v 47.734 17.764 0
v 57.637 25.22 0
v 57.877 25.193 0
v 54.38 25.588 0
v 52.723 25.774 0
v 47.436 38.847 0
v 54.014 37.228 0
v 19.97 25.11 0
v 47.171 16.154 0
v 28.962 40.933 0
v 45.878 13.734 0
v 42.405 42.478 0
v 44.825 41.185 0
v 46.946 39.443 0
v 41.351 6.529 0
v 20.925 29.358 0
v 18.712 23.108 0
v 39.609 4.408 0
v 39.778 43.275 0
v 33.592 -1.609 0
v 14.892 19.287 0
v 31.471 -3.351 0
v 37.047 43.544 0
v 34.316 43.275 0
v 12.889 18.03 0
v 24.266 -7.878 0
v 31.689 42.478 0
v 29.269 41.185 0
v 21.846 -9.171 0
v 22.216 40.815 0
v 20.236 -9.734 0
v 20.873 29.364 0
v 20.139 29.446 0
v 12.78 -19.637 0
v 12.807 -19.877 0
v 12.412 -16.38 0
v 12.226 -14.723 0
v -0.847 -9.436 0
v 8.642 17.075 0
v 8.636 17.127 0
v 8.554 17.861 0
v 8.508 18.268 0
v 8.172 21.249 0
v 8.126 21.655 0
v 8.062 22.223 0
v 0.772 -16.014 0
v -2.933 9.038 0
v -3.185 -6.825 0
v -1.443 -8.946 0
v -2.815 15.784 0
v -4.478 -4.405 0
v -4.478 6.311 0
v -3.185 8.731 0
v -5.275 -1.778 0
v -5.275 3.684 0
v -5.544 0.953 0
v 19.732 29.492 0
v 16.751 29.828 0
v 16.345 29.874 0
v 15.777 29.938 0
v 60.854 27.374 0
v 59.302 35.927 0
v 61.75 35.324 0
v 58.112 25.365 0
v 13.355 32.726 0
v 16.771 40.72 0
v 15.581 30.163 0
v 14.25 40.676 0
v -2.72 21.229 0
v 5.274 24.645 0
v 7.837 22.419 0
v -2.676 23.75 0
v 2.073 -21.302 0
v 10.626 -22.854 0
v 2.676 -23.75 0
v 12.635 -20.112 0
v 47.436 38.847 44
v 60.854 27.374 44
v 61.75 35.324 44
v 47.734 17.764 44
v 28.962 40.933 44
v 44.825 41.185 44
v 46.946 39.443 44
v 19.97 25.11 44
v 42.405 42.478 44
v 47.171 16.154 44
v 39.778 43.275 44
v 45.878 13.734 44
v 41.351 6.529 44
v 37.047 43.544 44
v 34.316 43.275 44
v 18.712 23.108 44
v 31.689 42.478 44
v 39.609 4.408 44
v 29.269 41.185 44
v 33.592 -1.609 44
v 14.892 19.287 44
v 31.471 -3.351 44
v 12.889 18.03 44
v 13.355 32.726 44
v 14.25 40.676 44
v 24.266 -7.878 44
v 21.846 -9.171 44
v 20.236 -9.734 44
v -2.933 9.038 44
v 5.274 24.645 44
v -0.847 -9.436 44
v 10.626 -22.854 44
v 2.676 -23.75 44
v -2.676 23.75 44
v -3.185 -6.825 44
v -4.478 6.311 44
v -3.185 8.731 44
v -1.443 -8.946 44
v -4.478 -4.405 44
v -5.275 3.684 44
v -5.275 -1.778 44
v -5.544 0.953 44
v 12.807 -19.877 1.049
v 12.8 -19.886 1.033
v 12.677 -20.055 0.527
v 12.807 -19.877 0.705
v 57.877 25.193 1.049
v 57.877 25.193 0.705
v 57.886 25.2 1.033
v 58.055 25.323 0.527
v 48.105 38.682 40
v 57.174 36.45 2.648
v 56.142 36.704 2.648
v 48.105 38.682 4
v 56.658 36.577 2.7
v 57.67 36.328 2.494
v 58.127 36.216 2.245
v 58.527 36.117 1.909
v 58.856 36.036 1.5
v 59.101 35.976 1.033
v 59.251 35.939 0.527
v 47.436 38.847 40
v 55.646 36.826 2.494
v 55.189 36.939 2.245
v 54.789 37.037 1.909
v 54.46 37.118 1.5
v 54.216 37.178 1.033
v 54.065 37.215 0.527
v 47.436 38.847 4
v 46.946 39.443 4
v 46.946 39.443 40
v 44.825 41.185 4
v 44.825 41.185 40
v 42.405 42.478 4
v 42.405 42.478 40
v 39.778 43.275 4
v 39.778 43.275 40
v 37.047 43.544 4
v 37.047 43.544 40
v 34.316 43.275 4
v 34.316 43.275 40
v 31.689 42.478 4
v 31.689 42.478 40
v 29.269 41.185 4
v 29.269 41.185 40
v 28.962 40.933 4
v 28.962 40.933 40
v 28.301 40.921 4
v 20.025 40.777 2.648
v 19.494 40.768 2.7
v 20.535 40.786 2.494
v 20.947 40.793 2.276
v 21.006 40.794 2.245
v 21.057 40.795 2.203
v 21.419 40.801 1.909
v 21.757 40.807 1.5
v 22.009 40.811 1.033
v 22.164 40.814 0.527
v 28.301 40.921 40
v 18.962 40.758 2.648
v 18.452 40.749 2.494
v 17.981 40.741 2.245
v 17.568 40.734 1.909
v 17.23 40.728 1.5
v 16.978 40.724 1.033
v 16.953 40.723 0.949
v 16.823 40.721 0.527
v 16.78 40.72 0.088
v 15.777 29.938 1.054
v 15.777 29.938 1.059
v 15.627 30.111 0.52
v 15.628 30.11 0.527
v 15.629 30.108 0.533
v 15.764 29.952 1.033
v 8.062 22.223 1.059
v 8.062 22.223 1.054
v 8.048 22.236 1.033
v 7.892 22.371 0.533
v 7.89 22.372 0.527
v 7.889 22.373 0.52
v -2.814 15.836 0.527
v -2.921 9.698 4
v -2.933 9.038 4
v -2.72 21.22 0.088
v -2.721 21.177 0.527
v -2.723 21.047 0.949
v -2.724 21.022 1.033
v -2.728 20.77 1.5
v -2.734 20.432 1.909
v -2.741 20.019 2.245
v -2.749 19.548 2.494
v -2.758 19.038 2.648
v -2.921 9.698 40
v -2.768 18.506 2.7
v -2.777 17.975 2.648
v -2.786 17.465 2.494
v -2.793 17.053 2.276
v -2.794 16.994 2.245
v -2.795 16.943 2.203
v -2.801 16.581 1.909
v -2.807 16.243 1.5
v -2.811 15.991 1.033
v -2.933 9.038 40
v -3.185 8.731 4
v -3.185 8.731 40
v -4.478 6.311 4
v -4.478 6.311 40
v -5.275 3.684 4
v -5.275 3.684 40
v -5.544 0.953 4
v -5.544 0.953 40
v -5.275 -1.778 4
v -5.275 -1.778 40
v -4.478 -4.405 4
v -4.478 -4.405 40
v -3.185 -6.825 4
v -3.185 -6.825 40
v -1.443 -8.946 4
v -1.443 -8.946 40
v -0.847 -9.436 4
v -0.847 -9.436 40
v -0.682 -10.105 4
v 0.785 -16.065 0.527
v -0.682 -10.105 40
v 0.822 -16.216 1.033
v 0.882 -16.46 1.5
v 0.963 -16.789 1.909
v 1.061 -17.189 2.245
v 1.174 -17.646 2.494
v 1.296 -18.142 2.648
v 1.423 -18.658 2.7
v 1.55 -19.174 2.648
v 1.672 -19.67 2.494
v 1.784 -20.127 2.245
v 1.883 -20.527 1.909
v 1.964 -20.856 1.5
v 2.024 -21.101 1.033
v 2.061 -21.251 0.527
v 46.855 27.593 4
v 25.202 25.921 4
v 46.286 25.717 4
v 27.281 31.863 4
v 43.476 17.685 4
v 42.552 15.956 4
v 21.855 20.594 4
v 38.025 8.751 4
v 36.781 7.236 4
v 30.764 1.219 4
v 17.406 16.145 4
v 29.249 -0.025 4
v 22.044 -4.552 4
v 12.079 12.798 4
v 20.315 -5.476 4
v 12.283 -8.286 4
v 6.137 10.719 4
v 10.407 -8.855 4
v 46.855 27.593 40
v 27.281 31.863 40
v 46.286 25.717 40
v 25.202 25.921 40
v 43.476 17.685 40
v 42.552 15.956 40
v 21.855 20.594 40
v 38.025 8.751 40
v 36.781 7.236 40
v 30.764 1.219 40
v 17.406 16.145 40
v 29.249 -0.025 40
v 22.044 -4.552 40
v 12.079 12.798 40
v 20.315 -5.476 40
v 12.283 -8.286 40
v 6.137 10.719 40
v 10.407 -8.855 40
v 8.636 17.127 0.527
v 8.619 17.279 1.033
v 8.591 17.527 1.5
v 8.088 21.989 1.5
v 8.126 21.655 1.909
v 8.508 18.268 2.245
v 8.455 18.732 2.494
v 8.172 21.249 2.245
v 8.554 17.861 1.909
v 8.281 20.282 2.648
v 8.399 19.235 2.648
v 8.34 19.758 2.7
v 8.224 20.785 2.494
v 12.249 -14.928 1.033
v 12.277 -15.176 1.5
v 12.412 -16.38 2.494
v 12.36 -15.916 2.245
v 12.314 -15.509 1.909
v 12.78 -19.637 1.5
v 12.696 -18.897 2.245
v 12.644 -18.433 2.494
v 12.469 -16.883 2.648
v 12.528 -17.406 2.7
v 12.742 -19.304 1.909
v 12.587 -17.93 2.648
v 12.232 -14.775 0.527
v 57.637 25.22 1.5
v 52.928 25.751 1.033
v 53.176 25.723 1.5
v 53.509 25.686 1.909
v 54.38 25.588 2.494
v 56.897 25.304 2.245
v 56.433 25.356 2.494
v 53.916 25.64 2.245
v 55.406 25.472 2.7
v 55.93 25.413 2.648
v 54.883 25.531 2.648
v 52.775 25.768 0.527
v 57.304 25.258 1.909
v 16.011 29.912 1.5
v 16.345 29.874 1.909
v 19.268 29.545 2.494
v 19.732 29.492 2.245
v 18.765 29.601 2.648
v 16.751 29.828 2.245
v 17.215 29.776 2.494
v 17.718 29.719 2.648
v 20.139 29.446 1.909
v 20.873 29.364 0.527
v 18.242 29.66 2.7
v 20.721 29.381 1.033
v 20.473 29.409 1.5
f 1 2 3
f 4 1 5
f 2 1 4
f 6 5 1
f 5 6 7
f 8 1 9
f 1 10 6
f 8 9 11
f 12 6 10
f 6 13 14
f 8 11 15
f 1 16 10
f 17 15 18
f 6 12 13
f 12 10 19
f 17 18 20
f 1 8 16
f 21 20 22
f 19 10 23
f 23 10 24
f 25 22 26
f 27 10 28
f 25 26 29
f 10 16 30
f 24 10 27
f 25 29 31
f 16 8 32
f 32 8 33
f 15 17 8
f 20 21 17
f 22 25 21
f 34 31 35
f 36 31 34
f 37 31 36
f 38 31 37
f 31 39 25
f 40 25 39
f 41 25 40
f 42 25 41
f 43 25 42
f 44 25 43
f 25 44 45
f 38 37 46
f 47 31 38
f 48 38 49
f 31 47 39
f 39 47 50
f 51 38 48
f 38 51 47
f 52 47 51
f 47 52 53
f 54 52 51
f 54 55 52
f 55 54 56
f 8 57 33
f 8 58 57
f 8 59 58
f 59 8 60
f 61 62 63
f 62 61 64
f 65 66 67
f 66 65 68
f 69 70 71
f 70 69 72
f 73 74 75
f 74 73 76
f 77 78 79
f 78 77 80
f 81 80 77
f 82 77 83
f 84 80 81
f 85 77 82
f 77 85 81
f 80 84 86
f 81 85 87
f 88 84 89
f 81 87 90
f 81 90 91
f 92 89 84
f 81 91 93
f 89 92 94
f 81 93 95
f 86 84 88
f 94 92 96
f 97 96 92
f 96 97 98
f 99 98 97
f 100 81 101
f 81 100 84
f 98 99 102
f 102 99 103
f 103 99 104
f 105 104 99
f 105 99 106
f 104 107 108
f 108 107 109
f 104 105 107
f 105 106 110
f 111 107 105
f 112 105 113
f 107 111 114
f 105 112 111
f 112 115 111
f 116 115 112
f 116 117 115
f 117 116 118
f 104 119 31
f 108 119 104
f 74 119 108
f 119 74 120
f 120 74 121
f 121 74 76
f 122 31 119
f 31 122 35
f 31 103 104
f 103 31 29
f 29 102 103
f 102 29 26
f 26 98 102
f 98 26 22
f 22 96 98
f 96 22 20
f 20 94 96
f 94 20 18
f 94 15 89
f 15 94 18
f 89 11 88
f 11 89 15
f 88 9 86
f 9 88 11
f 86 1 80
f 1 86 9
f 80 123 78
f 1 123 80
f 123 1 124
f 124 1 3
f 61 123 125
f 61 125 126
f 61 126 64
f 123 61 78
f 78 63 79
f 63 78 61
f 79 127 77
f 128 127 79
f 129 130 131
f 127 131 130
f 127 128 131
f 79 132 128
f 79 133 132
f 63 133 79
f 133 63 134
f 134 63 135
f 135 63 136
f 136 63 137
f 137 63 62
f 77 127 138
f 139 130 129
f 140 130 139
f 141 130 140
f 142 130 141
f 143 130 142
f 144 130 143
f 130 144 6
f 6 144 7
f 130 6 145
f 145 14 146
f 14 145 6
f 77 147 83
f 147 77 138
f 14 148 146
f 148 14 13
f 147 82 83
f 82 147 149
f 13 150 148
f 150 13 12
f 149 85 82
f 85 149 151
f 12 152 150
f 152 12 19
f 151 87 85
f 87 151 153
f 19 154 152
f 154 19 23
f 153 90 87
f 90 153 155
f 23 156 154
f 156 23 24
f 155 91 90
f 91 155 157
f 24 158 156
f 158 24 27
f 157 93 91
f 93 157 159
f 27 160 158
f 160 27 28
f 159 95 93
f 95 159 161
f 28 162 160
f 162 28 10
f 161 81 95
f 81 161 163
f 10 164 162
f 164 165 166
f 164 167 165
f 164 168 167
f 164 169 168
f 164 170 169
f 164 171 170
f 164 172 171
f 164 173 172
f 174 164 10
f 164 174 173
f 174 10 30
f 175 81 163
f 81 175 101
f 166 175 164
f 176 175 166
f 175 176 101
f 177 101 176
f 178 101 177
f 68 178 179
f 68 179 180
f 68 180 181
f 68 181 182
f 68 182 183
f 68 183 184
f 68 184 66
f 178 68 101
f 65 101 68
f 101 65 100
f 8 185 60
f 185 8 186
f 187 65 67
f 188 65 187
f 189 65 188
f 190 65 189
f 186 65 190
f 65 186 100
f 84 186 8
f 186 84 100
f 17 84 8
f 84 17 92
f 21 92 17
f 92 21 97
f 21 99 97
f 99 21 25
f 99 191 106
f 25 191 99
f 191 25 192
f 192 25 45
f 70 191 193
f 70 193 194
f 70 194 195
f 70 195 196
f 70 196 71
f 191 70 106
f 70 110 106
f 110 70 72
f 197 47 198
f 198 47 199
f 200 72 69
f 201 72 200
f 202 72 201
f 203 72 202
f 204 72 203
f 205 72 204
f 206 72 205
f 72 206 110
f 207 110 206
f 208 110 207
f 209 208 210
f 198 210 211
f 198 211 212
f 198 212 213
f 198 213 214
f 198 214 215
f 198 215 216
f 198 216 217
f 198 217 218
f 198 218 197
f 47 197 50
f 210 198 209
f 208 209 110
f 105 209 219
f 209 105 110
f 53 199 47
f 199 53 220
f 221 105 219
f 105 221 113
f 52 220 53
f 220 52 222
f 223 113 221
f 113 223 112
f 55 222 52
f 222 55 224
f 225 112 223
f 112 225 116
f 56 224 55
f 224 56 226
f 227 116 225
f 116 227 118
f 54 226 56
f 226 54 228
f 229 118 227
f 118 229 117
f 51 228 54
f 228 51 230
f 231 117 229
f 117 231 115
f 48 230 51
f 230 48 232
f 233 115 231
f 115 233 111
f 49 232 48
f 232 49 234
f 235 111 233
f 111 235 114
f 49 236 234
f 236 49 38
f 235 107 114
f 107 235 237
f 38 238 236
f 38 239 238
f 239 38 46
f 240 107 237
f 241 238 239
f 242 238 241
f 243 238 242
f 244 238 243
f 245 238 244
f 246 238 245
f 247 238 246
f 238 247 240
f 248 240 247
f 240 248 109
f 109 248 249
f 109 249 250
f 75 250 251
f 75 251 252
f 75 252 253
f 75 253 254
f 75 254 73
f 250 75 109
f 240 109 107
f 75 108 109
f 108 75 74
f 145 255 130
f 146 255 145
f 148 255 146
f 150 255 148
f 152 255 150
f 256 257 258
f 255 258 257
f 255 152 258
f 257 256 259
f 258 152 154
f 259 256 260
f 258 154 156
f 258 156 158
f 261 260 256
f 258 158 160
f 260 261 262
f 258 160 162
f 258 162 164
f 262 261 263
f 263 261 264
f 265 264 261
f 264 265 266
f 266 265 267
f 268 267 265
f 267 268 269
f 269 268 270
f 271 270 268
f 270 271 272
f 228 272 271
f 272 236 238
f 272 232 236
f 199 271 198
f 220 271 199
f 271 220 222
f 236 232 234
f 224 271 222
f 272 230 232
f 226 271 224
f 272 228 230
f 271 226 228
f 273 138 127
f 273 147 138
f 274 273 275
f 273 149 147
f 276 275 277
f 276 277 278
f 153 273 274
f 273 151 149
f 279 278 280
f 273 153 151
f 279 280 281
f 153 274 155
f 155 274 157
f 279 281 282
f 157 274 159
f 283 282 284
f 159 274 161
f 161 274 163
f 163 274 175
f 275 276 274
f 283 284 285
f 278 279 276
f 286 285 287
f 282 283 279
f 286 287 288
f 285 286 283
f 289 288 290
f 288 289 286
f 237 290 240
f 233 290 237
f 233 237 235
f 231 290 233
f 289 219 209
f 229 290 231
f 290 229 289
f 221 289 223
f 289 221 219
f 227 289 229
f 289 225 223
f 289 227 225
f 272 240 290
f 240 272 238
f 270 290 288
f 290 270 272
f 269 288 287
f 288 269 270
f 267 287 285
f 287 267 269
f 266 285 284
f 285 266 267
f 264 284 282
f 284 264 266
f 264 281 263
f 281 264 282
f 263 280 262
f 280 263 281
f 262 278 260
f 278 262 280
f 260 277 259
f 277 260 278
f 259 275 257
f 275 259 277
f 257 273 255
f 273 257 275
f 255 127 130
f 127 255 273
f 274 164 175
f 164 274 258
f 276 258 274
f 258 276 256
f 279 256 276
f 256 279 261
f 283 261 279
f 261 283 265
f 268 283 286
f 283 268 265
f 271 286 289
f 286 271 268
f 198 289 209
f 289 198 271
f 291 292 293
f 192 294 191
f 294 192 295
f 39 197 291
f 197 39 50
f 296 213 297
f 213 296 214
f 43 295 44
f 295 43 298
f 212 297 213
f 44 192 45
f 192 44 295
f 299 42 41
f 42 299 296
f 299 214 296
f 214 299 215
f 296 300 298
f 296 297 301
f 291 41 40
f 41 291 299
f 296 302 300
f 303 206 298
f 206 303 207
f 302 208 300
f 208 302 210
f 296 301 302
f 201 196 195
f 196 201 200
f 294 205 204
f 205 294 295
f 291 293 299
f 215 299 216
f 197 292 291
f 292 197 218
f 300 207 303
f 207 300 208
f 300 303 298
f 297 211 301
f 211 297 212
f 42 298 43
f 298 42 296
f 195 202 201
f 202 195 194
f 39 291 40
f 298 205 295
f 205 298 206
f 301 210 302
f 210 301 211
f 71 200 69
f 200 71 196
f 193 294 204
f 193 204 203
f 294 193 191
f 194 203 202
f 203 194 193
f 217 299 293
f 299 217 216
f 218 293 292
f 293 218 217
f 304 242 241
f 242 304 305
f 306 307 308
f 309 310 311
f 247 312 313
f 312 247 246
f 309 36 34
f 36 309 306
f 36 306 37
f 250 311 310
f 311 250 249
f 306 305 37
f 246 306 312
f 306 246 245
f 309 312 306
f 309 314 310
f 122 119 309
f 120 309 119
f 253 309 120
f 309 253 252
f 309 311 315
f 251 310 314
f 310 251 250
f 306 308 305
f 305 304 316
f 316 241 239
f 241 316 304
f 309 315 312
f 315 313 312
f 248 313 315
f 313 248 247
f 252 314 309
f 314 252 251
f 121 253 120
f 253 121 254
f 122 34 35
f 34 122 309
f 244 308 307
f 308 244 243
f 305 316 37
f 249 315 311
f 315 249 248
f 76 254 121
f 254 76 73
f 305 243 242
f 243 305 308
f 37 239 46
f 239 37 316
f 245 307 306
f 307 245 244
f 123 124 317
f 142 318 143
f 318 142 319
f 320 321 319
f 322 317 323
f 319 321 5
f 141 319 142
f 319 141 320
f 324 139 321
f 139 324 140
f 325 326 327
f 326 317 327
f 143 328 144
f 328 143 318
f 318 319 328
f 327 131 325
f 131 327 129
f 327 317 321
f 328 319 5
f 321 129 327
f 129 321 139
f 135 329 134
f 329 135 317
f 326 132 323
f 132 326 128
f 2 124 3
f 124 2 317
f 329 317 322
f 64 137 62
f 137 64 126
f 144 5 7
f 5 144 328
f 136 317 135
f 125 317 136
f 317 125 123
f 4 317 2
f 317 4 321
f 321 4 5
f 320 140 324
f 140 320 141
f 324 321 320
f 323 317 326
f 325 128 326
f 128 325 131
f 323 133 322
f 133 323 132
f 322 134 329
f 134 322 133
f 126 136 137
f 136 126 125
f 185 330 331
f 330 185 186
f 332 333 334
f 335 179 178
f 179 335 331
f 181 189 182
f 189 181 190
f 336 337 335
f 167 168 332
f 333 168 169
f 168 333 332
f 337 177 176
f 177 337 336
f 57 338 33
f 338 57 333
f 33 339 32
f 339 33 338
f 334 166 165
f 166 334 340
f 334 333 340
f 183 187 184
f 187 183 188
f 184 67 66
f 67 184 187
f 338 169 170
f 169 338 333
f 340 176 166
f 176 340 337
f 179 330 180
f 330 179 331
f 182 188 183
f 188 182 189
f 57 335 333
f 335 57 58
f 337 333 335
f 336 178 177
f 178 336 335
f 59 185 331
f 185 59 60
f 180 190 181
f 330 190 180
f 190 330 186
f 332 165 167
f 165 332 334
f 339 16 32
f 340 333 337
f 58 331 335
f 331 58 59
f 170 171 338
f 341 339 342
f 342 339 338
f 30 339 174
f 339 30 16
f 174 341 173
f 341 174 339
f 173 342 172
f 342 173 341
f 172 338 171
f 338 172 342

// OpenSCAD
$fn = 32;

// ----------------------------------------------------------------------
// Air duct: 28 mm duct, 4 mm wall, 44 mm across
// ----------------------------------------------------------------------

// --- parameters (mm) ---
duct_r = 14;              // duct core radius
duct_d = 28;              // duct core diameter
wall = 4;                 // duct wall thickness
height = 44;              // duct width (extrusion height)
port_r = 23.9;            // port flange half width
port_d = 47.8;            // port flange width
port_t = 8;               // port flange thickness
bolt_d = 5.4;             // port bolt holes
bolt_offset = 18.7;       // bolt hole offset from the port axis

difference() {
  /* outer hull chain: tube with a flat flange plate at every port */
  linear_extrude(height = 44) {
    hull() {
      polygon([[2.676, -23.75], [-2.676, 23.75], [5.274, 24.645], [10.626, -22.854]]);
      translate([10.931, 1.232]) circle(r = 14);
    }
    hull() {
      translate([10.931, 1.232]) circle(r = 14);
      translate([8.456, 0.953]) circle(r = 14);
    }
    hull() {
      translate([8.456, 0.953]) circle(r = 14);
      translate([16.488, 3.763]) circle(r = 14);
    }
    hull() {
      translate([16.488, 3.763]) circle(r = 14);
      translate([23.693, 8.29]) circle(r = 14);
    }
    hull() {
      translate([23.693, 8.29]) circle(r = 14);
      translate([29.71, 14.307]) circle(r = 14);
    }
    hull() {
      translate([29.71, 14.307]) circle(r = 14);
      translate([34.237, 21.512]) circle(r = 14);
    }
    hull() {
      translate([34.237, 21.512]) circle(r = 14);
      translate([37.047, 29.544]) circle(r = 14);
    }
    hull() {
      translate([37.047, 29.544]) circle(r = 14);
      translate([36.768, 27.069]) circle(r = 14);
    }
    hull() {
      translate([36.768, 27.069]) circle(r = 14);
      polygon([[14.25, 40.676], [61.75, 35.324], [60.854, 27.374], [13.355, 32.726]]);
    }
  }
  /* air passage: the same chain inset by the wall, 5 mm proud of the ports */
  translate([0, 0, 4]) linear_extrude(height = 36) {
    hull() {
      translate([-4.969, -0.56]) circle(r = 10);
      translate([8.456, 0.953]) circle(r = 10);
    }
    hull() {
      translate([8.456, 0.953]) circle(r = 10);
      translate([16.488, 3.763]) circle(r = 10);
    }
    hull() {
      translate([16.488, 3.763]) circle(r = 10);
      translate([23.693, 8.29]) circle(r = 10);
    }
    hull() {
      translate([23.693, 8.29]) circle(r = 10);
      translate([29.71, 14.307]) circle(r = 10);
    }
    hull() {
      translate([29.71, 14.307]) circle(r = 10);
      translate([34.237, 21.512]) circle(r = 10);
    }
    hull() {
      translate([34.237, 21.512]) circle(r = 10);
      translate([37.047, 29.544]) circle(r = 10);
    }
    hull() {
      translate([37.047, 29.544]) circle(r = 10);
      translate([38.56, 42.969]) circle(r = 10);
    }
  }
  translate([0, 0]) rotate([0, 0, -83.57]) translate([-18.7, -2.5]) rotate([-90, 0, 0]) cylinder(h = 13, d = 5.4);
  translate([0, 0]) rotate([0, 0, -83.57]) translate([18.7, -2.5]) rotate([-90, 0, 0]) cylinder(h = 13, d = 5.4);
  translate([38, 38]) rotate([0, 0, 173.57]) translate([-18.7, -2.5]) rotate([-90, 0, 0]) cylinder(h = 13, d = 5.4);
  translate([38, 38]) rotate([0, 0, 173.57]) translate([18.7, -2.5]) rotate([-90, 0, 0]) cylinder(h = 13, d = 5.4);
}
